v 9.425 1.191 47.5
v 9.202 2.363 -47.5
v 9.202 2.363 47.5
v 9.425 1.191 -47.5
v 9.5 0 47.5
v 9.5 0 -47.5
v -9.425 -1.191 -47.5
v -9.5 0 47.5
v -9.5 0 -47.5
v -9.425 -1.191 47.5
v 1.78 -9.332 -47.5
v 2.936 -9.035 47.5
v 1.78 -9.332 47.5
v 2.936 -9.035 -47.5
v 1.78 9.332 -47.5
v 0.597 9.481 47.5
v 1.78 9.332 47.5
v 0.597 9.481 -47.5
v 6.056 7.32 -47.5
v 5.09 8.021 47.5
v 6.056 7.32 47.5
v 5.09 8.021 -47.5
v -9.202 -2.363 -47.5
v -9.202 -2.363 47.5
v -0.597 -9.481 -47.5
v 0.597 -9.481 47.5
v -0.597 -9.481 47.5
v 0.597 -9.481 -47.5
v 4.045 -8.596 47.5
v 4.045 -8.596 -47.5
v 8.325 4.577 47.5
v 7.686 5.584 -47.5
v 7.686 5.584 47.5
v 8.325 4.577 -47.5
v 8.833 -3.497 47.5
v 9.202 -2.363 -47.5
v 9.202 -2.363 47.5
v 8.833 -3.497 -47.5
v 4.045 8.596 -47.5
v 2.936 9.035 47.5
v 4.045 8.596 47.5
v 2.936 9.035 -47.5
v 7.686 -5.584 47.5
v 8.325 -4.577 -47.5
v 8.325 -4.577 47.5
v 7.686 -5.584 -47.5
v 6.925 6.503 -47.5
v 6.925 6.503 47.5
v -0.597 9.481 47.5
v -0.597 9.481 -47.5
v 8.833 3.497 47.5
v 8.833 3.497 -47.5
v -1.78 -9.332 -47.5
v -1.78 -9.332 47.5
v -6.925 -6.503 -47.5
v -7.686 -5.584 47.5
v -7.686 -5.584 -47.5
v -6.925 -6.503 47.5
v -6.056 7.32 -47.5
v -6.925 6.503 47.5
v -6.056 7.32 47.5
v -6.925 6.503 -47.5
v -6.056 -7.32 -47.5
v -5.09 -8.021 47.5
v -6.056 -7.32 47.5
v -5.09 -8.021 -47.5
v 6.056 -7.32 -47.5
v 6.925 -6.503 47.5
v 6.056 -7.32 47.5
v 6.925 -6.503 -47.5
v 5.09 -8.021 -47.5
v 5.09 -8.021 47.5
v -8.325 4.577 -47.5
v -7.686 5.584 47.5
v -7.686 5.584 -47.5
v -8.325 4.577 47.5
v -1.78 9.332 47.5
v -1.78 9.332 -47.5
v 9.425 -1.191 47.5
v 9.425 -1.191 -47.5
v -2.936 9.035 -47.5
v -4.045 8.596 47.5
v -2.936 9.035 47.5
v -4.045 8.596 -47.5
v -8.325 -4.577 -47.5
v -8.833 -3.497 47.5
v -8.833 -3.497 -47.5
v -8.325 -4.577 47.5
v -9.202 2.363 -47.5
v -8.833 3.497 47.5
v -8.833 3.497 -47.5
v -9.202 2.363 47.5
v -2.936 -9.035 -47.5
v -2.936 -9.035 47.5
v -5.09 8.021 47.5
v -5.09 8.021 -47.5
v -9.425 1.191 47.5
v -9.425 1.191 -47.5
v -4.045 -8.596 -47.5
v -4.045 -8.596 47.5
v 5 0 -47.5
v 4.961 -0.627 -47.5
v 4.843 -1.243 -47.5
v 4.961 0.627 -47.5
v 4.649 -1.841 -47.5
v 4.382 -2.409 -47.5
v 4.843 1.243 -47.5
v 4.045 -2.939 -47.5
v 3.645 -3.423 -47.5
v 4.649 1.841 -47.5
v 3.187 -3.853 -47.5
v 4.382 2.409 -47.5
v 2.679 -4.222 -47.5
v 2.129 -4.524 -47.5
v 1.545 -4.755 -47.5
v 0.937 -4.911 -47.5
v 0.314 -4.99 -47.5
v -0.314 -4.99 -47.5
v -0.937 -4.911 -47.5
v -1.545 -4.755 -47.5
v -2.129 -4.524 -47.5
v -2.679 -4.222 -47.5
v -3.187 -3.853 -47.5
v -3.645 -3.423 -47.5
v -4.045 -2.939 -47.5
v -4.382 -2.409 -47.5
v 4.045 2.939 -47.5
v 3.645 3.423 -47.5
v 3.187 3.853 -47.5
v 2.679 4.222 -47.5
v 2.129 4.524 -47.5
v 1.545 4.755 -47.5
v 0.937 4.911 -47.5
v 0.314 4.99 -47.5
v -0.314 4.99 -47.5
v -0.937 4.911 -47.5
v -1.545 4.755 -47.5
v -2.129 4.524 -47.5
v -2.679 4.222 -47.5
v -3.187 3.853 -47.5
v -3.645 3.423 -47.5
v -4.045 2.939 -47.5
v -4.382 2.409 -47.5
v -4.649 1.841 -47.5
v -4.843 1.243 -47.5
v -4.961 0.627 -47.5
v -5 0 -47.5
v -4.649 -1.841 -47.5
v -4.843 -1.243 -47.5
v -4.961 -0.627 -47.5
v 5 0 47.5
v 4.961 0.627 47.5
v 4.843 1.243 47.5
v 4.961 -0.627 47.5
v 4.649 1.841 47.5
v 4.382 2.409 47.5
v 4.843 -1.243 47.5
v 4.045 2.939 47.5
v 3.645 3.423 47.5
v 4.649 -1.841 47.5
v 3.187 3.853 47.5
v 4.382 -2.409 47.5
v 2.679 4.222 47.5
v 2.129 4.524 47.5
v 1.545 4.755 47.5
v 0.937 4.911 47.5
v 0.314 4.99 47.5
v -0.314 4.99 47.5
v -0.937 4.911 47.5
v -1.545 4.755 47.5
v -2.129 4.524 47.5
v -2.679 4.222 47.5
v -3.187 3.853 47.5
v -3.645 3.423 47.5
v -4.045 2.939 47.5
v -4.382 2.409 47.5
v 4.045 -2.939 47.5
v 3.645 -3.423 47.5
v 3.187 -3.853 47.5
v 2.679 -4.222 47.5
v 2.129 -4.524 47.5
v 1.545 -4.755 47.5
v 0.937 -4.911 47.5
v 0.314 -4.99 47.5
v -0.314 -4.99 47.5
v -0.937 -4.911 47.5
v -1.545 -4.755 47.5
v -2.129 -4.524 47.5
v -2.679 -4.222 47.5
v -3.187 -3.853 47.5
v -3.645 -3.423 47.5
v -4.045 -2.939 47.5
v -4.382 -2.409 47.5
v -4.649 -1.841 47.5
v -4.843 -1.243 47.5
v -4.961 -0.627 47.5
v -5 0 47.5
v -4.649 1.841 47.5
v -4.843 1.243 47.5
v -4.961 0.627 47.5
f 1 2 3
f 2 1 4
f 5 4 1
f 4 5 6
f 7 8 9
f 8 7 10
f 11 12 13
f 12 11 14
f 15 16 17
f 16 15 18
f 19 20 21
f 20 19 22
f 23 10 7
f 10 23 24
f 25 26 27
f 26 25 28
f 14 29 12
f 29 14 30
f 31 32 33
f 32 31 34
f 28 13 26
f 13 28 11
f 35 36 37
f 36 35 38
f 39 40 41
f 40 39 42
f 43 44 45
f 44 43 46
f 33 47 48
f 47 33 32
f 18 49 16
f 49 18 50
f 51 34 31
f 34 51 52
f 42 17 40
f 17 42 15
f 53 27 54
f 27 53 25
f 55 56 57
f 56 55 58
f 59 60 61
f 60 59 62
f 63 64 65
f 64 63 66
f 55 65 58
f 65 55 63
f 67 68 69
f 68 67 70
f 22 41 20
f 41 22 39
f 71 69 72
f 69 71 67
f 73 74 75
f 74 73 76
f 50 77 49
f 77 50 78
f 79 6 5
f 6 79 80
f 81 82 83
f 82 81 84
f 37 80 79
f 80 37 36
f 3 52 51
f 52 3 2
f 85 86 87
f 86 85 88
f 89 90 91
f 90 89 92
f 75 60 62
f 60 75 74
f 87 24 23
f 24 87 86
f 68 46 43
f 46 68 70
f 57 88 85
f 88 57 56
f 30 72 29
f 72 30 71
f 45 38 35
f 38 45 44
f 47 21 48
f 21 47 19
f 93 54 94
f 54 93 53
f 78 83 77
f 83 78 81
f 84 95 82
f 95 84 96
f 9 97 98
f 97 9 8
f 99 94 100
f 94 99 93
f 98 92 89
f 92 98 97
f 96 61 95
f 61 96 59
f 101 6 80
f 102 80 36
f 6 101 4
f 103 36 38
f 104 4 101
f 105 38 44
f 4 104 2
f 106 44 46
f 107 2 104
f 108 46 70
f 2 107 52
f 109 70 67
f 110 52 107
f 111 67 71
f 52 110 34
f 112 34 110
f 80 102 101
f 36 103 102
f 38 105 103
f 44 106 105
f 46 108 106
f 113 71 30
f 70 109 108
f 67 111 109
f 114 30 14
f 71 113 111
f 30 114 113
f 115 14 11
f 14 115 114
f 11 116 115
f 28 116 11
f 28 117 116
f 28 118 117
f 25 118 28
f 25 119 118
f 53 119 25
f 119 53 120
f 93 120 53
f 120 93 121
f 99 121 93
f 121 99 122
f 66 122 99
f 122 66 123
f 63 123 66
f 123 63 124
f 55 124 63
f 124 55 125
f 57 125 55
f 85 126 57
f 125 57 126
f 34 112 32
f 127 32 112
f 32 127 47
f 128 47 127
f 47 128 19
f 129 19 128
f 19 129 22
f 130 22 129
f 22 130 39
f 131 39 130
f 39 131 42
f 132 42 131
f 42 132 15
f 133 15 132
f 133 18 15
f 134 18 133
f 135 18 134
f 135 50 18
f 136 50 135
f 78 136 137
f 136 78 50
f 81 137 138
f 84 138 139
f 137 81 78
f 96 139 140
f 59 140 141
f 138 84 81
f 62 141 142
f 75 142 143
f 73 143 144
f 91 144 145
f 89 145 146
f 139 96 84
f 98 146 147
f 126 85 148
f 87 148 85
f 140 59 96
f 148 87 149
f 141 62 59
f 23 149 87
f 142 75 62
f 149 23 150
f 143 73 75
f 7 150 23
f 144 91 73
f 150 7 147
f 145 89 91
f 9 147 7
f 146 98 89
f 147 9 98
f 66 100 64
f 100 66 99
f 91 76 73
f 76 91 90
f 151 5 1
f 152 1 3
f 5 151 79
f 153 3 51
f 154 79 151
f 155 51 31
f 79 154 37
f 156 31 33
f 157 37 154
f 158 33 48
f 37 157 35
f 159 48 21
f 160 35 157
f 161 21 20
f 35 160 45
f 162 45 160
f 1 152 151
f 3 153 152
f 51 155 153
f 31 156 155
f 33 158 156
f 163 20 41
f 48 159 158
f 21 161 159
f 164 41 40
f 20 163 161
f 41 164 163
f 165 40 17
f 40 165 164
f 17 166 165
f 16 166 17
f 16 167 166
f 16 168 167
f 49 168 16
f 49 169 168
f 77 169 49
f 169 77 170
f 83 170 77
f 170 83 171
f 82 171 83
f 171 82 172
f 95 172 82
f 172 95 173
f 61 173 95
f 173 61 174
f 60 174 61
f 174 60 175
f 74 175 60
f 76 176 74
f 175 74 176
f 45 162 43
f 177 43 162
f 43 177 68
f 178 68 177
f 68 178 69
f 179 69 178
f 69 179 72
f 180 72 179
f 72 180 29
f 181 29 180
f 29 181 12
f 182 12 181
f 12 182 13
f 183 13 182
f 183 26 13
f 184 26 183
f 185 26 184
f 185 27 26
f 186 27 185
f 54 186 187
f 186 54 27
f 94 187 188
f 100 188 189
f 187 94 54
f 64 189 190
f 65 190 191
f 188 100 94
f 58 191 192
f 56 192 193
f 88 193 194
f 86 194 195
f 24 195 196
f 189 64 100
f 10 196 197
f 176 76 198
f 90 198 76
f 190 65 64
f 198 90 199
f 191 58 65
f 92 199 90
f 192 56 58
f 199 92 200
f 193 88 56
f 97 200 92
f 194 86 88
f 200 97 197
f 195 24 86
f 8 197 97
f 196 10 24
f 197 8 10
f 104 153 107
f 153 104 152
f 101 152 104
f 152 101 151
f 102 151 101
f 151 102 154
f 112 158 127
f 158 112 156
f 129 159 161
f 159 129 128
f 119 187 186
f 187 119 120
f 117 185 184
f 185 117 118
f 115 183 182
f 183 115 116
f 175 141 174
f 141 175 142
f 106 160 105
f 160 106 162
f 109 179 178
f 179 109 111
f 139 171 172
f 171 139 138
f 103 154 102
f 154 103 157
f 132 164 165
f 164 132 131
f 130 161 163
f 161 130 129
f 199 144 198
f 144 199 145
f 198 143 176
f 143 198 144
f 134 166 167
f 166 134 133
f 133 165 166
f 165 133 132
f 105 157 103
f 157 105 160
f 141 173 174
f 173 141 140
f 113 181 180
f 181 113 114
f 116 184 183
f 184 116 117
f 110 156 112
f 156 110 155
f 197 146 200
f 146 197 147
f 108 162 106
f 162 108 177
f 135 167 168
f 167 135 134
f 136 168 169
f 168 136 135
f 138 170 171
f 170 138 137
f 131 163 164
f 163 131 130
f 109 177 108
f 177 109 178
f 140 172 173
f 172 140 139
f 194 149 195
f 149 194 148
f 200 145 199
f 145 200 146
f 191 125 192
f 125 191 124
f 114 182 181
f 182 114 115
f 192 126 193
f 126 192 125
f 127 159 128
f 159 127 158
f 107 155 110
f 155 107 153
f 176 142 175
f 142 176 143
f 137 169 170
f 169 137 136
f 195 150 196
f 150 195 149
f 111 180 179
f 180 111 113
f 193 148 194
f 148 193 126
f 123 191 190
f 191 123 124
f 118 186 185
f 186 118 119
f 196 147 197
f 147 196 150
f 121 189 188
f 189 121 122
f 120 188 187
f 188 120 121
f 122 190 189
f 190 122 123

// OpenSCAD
$fn = 50;


difference() {
	union() {
		translate(v = [0, 0, -47.5000000000]) {
			cylinder(h = 95, r = 9.5000000000);
		}
	}
	union() {
		translate(v = [0, 0, -100.0000000000]) {
			cylinder(h = 200, r = 5.0000000000);
		}
	}
}
